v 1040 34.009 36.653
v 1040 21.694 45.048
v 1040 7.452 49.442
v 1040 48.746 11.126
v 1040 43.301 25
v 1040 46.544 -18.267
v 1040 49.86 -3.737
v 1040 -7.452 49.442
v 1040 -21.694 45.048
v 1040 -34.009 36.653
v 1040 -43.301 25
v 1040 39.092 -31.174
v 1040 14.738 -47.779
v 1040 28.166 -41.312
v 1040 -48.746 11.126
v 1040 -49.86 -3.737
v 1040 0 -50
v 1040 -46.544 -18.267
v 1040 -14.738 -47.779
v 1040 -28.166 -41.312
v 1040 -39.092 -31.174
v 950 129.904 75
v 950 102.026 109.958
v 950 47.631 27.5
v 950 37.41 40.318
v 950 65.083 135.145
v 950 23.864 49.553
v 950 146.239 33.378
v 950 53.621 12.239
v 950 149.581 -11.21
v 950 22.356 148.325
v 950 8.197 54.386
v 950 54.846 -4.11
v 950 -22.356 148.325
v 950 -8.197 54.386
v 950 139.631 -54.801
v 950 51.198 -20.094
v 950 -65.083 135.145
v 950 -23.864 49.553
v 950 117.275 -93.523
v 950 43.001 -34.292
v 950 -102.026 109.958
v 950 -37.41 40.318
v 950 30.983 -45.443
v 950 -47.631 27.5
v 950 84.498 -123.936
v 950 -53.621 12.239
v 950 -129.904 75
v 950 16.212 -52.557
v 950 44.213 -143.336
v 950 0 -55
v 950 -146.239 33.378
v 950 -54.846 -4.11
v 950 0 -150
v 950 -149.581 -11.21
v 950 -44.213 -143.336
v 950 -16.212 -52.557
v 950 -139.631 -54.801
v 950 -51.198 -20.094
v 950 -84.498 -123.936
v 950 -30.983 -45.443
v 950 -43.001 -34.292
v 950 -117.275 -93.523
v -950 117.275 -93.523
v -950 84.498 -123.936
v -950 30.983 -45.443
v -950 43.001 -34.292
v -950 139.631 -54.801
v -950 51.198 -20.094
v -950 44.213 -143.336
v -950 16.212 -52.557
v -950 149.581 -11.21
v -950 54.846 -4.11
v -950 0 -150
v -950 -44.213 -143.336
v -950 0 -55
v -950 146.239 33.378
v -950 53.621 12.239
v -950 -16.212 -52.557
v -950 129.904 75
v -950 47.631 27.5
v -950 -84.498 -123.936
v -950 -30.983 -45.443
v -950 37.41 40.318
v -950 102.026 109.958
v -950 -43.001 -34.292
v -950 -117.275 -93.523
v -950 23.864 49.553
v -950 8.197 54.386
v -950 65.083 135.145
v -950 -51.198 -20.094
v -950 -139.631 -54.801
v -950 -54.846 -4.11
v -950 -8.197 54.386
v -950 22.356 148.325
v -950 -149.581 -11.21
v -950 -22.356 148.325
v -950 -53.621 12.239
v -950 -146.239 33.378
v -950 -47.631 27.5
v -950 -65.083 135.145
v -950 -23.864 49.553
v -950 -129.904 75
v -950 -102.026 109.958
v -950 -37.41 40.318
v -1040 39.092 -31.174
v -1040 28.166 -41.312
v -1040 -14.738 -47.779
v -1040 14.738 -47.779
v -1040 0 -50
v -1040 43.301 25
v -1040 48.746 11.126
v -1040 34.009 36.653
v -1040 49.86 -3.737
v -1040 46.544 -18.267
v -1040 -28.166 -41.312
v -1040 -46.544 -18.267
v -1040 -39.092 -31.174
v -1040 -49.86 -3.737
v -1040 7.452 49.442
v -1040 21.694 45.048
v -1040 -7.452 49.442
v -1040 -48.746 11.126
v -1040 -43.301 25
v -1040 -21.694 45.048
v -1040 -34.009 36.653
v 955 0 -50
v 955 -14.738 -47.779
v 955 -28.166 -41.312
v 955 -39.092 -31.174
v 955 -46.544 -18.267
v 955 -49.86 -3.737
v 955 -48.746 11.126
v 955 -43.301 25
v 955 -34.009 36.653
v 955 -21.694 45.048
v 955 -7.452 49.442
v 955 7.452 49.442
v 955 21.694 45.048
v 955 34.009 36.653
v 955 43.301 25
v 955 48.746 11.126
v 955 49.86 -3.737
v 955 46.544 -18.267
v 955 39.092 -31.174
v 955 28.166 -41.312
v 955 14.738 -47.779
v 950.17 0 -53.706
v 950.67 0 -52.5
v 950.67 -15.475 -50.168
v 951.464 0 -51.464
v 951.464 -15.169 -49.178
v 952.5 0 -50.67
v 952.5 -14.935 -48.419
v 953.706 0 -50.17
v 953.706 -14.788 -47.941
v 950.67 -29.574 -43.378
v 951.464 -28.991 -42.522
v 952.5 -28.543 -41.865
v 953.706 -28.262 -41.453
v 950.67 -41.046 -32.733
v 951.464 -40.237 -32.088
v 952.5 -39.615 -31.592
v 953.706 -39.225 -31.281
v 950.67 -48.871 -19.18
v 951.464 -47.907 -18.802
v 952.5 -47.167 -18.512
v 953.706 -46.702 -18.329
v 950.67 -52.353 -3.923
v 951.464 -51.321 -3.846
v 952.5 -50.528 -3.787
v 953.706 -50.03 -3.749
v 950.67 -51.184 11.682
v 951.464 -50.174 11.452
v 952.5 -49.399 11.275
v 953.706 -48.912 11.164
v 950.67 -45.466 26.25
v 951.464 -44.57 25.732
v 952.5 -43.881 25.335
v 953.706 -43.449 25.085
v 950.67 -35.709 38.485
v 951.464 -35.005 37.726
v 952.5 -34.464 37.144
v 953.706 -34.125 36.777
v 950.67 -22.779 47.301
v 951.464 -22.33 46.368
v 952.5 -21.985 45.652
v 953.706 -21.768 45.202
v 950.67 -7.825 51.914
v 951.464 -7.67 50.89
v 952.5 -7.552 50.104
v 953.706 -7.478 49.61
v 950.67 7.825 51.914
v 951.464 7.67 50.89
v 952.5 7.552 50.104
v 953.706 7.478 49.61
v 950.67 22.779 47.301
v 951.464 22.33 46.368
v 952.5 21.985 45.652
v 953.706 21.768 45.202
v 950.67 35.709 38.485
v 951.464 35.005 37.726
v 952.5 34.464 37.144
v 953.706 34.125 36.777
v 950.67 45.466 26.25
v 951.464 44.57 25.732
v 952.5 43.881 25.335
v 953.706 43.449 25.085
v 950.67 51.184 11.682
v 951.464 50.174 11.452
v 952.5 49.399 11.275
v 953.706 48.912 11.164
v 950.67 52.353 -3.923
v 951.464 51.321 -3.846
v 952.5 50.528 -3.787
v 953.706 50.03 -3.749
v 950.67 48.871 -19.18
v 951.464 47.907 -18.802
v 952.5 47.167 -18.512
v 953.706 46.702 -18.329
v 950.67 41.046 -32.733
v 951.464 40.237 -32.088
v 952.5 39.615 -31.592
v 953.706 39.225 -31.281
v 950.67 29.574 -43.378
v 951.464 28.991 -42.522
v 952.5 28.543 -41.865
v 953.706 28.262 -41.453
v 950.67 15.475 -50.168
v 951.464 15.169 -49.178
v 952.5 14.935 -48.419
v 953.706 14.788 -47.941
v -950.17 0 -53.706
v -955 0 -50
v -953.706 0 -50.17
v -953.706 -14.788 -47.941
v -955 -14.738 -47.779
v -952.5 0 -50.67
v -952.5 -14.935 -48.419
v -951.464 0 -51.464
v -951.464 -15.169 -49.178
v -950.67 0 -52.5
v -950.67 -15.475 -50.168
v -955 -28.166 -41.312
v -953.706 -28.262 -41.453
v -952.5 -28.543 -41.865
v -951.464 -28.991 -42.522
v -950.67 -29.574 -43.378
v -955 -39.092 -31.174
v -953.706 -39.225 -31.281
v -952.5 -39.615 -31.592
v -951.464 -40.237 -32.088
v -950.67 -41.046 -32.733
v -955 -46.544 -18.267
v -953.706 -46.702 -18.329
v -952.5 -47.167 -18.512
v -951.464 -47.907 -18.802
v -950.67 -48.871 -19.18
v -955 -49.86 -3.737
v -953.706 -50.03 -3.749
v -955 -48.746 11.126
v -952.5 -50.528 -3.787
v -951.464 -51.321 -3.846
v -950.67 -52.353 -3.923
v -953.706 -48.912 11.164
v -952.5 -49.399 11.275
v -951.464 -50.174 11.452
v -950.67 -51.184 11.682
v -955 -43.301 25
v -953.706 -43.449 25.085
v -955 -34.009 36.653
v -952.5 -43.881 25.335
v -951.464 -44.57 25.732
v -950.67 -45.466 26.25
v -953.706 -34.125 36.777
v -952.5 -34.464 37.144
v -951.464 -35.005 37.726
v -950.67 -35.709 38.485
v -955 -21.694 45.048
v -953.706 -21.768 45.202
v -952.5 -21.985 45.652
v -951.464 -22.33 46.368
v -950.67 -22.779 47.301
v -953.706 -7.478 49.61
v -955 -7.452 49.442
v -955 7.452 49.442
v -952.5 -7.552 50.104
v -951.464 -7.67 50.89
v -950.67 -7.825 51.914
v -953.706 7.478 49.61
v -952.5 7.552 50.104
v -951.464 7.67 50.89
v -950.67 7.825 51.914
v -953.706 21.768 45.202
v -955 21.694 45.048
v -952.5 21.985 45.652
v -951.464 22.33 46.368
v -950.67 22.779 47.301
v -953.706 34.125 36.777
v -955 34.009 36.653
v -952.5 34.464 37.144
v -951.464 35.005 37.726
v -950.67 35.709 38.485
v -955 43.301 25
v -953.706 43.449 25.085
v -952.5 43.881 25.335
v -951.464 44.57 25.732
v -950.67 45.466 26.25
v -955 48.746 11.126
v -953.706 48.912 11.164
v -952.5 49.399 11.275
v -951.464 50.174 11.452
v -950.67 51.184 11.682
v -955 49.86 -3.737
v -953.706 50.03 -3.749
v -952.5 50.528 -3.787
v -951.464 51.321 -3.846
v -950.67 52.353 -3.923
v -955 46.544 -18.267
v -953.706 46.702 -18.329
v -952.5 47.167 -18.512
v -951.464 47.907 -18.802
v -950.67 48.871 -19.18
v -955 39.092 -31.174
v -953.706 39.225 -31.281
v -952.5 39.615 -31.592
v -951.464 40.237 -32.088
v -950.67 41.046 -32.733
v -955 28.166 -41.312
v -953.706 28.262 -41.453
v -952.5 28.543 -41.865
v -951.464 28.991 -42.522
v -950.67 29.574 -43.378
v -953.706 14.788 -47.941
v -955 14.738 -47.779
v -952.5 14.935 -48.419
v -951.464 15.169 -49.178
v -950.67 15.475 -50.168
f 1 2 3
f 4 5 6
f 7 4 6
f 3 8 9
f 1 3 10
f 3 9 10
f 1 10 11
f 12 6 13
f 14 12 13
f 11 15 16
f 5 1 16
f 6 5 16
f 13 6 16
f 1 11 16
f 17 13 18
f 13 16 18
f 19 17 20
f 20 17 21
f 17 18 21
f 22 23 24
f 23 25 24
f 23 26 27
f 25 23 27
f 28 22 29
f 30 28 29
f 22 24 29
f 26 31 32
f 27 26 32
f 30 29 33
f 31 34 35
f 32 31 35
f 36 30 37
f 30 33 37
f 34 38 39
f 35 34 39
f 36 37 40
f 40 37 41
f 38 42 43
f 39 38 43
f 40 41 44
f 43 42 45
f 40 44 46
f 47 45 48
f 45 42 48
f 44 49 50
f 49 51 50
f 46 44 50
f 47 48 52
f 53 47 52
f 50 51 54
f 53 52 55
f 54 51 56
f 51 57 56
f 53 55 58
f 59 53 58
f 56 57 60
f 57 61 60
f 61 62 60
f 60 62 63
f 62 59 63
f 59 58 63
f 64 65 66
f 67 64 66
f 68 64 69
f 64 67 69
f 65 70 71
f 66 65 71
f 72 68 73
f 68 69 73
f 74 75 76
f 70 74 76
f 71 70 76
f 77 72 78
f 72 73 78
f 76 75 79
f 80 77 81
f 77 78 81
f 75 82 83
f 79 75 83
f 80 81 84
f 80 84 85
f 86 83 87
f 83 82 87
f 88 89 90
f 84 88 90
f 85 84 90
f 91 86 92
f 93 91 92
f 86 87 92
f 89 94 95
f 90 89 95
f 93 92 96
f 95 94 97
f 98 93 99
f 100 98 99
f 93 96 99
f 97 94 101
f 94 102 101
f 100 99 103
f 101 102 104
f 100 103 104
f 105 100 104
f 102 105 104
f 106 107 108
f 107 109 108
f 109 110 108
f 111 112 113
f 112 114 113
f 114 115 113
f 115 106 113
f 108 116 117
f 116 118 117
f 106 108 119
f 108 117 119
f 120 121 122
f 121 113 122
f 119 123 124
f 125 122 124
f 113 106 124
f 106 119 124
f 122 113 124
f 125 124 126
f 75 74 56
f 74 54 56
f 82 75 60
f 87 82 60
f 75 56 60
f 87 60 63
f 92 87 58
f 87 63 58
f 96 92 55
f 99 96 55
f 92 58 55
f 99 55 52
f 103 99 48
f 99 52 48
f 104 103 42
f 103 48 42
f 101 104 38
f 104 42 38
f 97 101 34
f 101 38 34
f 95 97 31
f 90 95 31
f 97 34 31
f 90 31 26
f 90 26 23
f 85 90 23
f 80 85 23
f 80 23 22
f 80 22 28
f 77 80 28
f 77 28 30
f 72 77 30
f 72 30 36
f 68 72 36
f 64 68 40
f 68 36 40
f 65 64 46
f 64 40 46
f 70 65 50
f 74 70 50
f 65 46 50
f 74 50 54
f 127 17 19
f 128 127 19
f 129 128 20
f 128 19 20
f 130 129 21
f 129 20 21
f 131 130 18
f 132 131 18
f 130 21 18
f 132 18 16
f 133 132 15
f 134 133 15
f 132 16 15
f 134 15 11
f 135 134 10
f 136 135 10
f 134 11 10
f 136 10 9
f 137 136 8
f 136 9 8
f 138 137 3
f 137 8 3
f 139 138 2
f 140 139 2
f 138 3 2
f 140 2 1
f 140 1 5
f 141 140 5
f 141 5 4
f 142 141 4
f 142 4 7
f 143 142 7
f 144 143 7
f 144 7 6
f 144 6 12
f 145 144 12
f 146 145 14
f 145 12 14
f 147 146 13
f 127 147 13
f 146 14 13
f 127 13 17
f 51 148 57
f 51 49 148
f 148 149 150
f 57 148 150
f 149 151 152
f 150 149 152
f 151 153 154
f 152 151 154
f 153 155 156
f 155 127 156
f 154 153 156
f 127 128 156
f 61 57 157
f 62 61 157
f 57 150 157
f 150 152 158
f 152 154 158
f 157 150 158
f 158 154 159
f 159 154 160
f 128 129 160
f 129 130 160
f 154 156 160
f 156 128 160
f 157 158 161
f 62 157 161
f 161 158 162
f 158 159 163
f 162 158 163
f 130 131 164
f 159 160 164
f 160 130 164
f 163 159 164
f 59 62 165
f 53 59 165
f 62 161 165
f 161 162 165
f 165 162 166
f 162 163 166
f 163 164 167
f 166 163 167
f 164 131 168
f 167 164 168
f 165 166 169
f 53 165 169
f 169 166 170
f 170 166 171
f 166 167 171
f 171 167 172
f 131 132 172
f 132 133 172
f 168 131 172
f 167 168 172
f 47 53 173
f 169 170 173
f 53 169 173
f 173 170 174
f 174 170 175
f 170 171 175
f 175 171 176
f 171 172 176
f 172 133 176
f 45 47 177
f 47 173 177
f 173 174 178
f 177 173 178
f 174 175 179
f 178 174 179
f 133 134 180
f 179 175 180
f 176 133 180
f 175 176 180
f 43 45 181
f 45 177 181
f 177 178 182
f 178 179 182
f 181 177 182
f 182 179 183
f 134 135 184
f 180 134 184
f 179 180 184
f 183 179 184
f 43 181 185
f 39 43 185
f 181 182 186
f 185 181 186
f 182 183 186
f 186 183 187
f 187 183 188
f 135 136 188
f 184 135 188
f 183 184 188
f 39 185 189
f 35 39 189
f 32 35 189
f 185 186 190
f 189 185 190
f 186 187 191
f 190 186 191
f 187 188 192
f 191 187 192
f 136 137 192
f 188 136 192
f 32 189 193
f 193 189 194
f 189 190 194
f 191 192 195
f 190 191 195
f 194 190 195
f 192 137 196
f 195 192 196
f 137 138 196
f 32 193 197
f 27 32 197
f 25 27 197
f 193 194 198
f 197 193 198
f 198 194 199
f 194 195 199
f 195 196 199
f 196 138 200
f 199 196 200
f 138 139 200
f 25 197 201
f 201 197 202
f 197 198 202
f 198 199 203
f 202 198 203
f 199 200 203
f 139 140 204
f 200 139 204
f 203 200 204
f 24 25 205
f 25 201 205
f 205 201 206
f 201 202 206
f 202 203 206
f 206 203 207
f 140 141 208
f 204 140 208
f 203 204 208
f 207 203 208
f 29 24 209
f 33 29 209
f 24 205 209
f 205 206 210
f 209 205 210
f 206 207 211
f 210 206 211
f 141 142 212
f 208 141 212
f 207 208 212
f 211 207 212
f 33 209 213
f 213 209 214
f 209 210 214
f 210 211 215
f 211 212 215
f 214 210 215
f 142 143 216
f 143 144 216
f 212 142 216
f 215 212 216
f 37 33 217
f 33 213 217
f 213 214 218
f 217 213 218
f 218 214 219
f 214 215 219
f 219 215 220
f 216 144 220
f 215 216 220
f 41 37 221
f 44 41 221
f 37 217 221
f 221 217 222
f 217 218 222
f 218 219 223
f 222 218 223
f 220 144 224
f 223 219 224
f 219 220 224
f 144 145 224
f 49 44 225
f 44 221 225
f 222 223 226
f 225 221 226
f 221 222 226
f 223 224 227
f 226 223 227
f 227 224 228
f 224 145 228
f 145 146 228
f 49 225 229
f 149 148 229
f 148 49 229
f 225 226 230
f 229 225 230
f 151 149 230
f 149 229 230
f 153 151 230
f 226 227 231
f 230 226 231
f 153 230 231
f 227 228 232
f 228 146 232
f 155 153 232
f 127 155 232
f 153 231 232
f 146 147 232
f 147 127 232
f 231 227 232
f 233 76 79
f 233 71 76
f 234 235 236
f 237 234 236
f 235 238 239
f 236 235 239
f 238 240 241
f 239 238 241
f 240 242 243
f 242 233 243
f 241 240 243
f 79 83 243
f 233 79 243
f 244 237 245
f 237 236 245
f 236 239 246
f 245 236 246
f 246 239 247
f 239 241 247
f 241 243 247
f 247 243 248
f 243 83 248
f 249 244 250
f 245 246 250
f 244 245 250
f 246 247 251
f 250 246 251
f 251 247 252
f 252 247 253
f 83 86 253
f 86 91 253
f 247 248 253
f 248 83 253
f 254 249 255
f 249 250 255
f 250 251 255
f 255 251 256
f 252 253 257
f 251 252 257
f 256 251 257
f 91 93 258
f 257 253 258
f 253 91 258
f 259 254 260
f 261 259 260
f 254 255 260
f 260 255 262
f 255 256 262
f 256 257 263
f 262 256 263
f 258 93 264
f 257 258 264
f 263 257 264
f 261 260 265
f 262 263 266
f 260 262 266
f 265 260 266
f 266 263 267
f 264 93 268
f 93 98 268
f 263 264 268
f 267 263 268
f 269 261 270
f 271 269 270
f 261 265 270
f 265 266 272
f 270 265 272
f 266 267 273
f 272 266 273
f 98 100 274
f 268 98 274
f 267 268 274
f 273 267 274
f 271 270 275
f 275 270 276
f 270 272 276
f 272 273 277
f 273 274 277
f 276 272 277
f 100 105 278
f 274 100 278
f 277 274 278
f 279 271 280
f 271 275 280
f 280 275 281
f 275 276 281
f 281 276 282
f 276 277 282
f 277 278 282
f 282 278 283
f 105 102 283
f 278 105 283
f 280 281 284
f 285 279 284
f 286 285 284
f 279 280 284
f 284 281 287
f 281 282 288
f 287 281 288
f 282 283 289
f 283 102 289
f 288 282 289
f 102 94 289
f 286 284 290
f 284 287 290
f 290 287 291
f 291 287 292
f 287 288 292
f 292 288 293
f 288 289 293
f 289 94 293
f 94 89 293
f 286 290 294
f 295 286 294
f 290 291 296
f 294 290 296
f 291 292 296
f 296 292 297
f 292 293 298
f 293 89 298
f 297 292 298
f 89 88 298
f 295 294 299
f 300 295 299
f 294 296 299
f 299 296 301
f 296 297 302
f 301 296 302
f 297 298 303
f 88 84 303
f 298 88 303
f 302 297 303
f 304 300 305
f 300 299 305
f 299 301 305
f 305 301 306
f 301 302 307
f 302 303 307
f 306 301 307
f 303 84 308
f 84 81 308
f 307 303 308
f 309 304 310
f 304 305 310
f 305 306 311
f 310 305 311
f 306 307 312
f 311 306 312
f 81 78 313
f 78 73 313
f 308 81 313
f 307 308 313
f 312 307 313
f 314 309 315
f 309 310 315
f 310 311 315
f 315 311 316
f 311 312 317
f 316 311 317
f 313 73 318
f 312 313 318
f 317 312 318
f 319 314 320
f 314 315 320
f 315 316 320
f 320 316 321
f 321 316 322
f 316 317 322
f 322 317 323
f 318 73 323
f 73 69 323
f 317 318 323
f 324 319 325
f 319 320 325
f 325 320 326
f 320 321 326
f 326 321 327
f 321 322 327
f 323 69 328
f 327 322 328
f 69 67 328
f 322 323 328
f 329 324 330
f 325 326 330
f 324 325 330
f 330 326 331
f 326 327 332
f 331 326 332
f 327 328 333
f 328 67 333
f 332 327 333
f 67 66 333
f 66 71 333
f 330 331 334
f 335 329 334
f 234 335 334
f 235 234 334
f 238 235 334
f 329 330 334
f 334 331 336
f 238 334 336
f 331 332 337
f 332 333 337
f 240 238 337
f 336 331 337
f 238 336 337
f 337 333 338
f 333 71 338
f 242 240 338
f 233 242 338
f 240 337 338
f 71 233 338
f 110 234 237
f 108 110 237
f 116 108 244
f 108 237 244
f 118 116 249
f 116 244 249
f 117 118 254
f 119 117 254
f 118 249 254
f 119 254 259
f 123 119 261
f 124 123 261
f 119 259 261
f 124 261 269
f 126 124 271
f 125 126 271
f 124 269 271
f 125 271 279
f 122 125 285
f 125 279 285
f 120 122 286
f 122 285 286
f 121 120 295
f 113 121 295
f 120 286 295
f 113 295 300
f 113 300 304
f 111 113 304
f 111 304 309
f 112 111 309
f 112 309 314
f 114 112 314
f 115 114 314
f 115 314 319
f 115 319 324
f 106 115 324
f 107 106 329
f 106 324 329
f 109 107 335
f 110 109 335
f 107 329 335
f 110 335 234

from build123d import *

# Parameters (mm, degrees)
FILLET1_R = 5


with BuildPart() as part:
    # Sketch1 → Revolve1 (revolve)
    with BuildSketch(Plane(origin=(0, 0, 0), x_dir=(1, 0, 0), z_dir=(0, 1, 0))):
        Polygon((1040, 0), (-1040, 0), (-1040, 50), (-950, 50), (-950, 150), (950, 150), (950, 50), (1040, 50), align=None)
    revolve(axis=Axis((1040, 0, 0), (-1, 0, 0)))

    # Fillet1
    fillet1_edges = [part.edges().sort_by_distance(p)[0] for p in [
        (-950, 0, 50),
        (950, 0, 50),
    ]]
    fillet(fillet1_edges, radius=FILLET1_R)


solid = part.part
